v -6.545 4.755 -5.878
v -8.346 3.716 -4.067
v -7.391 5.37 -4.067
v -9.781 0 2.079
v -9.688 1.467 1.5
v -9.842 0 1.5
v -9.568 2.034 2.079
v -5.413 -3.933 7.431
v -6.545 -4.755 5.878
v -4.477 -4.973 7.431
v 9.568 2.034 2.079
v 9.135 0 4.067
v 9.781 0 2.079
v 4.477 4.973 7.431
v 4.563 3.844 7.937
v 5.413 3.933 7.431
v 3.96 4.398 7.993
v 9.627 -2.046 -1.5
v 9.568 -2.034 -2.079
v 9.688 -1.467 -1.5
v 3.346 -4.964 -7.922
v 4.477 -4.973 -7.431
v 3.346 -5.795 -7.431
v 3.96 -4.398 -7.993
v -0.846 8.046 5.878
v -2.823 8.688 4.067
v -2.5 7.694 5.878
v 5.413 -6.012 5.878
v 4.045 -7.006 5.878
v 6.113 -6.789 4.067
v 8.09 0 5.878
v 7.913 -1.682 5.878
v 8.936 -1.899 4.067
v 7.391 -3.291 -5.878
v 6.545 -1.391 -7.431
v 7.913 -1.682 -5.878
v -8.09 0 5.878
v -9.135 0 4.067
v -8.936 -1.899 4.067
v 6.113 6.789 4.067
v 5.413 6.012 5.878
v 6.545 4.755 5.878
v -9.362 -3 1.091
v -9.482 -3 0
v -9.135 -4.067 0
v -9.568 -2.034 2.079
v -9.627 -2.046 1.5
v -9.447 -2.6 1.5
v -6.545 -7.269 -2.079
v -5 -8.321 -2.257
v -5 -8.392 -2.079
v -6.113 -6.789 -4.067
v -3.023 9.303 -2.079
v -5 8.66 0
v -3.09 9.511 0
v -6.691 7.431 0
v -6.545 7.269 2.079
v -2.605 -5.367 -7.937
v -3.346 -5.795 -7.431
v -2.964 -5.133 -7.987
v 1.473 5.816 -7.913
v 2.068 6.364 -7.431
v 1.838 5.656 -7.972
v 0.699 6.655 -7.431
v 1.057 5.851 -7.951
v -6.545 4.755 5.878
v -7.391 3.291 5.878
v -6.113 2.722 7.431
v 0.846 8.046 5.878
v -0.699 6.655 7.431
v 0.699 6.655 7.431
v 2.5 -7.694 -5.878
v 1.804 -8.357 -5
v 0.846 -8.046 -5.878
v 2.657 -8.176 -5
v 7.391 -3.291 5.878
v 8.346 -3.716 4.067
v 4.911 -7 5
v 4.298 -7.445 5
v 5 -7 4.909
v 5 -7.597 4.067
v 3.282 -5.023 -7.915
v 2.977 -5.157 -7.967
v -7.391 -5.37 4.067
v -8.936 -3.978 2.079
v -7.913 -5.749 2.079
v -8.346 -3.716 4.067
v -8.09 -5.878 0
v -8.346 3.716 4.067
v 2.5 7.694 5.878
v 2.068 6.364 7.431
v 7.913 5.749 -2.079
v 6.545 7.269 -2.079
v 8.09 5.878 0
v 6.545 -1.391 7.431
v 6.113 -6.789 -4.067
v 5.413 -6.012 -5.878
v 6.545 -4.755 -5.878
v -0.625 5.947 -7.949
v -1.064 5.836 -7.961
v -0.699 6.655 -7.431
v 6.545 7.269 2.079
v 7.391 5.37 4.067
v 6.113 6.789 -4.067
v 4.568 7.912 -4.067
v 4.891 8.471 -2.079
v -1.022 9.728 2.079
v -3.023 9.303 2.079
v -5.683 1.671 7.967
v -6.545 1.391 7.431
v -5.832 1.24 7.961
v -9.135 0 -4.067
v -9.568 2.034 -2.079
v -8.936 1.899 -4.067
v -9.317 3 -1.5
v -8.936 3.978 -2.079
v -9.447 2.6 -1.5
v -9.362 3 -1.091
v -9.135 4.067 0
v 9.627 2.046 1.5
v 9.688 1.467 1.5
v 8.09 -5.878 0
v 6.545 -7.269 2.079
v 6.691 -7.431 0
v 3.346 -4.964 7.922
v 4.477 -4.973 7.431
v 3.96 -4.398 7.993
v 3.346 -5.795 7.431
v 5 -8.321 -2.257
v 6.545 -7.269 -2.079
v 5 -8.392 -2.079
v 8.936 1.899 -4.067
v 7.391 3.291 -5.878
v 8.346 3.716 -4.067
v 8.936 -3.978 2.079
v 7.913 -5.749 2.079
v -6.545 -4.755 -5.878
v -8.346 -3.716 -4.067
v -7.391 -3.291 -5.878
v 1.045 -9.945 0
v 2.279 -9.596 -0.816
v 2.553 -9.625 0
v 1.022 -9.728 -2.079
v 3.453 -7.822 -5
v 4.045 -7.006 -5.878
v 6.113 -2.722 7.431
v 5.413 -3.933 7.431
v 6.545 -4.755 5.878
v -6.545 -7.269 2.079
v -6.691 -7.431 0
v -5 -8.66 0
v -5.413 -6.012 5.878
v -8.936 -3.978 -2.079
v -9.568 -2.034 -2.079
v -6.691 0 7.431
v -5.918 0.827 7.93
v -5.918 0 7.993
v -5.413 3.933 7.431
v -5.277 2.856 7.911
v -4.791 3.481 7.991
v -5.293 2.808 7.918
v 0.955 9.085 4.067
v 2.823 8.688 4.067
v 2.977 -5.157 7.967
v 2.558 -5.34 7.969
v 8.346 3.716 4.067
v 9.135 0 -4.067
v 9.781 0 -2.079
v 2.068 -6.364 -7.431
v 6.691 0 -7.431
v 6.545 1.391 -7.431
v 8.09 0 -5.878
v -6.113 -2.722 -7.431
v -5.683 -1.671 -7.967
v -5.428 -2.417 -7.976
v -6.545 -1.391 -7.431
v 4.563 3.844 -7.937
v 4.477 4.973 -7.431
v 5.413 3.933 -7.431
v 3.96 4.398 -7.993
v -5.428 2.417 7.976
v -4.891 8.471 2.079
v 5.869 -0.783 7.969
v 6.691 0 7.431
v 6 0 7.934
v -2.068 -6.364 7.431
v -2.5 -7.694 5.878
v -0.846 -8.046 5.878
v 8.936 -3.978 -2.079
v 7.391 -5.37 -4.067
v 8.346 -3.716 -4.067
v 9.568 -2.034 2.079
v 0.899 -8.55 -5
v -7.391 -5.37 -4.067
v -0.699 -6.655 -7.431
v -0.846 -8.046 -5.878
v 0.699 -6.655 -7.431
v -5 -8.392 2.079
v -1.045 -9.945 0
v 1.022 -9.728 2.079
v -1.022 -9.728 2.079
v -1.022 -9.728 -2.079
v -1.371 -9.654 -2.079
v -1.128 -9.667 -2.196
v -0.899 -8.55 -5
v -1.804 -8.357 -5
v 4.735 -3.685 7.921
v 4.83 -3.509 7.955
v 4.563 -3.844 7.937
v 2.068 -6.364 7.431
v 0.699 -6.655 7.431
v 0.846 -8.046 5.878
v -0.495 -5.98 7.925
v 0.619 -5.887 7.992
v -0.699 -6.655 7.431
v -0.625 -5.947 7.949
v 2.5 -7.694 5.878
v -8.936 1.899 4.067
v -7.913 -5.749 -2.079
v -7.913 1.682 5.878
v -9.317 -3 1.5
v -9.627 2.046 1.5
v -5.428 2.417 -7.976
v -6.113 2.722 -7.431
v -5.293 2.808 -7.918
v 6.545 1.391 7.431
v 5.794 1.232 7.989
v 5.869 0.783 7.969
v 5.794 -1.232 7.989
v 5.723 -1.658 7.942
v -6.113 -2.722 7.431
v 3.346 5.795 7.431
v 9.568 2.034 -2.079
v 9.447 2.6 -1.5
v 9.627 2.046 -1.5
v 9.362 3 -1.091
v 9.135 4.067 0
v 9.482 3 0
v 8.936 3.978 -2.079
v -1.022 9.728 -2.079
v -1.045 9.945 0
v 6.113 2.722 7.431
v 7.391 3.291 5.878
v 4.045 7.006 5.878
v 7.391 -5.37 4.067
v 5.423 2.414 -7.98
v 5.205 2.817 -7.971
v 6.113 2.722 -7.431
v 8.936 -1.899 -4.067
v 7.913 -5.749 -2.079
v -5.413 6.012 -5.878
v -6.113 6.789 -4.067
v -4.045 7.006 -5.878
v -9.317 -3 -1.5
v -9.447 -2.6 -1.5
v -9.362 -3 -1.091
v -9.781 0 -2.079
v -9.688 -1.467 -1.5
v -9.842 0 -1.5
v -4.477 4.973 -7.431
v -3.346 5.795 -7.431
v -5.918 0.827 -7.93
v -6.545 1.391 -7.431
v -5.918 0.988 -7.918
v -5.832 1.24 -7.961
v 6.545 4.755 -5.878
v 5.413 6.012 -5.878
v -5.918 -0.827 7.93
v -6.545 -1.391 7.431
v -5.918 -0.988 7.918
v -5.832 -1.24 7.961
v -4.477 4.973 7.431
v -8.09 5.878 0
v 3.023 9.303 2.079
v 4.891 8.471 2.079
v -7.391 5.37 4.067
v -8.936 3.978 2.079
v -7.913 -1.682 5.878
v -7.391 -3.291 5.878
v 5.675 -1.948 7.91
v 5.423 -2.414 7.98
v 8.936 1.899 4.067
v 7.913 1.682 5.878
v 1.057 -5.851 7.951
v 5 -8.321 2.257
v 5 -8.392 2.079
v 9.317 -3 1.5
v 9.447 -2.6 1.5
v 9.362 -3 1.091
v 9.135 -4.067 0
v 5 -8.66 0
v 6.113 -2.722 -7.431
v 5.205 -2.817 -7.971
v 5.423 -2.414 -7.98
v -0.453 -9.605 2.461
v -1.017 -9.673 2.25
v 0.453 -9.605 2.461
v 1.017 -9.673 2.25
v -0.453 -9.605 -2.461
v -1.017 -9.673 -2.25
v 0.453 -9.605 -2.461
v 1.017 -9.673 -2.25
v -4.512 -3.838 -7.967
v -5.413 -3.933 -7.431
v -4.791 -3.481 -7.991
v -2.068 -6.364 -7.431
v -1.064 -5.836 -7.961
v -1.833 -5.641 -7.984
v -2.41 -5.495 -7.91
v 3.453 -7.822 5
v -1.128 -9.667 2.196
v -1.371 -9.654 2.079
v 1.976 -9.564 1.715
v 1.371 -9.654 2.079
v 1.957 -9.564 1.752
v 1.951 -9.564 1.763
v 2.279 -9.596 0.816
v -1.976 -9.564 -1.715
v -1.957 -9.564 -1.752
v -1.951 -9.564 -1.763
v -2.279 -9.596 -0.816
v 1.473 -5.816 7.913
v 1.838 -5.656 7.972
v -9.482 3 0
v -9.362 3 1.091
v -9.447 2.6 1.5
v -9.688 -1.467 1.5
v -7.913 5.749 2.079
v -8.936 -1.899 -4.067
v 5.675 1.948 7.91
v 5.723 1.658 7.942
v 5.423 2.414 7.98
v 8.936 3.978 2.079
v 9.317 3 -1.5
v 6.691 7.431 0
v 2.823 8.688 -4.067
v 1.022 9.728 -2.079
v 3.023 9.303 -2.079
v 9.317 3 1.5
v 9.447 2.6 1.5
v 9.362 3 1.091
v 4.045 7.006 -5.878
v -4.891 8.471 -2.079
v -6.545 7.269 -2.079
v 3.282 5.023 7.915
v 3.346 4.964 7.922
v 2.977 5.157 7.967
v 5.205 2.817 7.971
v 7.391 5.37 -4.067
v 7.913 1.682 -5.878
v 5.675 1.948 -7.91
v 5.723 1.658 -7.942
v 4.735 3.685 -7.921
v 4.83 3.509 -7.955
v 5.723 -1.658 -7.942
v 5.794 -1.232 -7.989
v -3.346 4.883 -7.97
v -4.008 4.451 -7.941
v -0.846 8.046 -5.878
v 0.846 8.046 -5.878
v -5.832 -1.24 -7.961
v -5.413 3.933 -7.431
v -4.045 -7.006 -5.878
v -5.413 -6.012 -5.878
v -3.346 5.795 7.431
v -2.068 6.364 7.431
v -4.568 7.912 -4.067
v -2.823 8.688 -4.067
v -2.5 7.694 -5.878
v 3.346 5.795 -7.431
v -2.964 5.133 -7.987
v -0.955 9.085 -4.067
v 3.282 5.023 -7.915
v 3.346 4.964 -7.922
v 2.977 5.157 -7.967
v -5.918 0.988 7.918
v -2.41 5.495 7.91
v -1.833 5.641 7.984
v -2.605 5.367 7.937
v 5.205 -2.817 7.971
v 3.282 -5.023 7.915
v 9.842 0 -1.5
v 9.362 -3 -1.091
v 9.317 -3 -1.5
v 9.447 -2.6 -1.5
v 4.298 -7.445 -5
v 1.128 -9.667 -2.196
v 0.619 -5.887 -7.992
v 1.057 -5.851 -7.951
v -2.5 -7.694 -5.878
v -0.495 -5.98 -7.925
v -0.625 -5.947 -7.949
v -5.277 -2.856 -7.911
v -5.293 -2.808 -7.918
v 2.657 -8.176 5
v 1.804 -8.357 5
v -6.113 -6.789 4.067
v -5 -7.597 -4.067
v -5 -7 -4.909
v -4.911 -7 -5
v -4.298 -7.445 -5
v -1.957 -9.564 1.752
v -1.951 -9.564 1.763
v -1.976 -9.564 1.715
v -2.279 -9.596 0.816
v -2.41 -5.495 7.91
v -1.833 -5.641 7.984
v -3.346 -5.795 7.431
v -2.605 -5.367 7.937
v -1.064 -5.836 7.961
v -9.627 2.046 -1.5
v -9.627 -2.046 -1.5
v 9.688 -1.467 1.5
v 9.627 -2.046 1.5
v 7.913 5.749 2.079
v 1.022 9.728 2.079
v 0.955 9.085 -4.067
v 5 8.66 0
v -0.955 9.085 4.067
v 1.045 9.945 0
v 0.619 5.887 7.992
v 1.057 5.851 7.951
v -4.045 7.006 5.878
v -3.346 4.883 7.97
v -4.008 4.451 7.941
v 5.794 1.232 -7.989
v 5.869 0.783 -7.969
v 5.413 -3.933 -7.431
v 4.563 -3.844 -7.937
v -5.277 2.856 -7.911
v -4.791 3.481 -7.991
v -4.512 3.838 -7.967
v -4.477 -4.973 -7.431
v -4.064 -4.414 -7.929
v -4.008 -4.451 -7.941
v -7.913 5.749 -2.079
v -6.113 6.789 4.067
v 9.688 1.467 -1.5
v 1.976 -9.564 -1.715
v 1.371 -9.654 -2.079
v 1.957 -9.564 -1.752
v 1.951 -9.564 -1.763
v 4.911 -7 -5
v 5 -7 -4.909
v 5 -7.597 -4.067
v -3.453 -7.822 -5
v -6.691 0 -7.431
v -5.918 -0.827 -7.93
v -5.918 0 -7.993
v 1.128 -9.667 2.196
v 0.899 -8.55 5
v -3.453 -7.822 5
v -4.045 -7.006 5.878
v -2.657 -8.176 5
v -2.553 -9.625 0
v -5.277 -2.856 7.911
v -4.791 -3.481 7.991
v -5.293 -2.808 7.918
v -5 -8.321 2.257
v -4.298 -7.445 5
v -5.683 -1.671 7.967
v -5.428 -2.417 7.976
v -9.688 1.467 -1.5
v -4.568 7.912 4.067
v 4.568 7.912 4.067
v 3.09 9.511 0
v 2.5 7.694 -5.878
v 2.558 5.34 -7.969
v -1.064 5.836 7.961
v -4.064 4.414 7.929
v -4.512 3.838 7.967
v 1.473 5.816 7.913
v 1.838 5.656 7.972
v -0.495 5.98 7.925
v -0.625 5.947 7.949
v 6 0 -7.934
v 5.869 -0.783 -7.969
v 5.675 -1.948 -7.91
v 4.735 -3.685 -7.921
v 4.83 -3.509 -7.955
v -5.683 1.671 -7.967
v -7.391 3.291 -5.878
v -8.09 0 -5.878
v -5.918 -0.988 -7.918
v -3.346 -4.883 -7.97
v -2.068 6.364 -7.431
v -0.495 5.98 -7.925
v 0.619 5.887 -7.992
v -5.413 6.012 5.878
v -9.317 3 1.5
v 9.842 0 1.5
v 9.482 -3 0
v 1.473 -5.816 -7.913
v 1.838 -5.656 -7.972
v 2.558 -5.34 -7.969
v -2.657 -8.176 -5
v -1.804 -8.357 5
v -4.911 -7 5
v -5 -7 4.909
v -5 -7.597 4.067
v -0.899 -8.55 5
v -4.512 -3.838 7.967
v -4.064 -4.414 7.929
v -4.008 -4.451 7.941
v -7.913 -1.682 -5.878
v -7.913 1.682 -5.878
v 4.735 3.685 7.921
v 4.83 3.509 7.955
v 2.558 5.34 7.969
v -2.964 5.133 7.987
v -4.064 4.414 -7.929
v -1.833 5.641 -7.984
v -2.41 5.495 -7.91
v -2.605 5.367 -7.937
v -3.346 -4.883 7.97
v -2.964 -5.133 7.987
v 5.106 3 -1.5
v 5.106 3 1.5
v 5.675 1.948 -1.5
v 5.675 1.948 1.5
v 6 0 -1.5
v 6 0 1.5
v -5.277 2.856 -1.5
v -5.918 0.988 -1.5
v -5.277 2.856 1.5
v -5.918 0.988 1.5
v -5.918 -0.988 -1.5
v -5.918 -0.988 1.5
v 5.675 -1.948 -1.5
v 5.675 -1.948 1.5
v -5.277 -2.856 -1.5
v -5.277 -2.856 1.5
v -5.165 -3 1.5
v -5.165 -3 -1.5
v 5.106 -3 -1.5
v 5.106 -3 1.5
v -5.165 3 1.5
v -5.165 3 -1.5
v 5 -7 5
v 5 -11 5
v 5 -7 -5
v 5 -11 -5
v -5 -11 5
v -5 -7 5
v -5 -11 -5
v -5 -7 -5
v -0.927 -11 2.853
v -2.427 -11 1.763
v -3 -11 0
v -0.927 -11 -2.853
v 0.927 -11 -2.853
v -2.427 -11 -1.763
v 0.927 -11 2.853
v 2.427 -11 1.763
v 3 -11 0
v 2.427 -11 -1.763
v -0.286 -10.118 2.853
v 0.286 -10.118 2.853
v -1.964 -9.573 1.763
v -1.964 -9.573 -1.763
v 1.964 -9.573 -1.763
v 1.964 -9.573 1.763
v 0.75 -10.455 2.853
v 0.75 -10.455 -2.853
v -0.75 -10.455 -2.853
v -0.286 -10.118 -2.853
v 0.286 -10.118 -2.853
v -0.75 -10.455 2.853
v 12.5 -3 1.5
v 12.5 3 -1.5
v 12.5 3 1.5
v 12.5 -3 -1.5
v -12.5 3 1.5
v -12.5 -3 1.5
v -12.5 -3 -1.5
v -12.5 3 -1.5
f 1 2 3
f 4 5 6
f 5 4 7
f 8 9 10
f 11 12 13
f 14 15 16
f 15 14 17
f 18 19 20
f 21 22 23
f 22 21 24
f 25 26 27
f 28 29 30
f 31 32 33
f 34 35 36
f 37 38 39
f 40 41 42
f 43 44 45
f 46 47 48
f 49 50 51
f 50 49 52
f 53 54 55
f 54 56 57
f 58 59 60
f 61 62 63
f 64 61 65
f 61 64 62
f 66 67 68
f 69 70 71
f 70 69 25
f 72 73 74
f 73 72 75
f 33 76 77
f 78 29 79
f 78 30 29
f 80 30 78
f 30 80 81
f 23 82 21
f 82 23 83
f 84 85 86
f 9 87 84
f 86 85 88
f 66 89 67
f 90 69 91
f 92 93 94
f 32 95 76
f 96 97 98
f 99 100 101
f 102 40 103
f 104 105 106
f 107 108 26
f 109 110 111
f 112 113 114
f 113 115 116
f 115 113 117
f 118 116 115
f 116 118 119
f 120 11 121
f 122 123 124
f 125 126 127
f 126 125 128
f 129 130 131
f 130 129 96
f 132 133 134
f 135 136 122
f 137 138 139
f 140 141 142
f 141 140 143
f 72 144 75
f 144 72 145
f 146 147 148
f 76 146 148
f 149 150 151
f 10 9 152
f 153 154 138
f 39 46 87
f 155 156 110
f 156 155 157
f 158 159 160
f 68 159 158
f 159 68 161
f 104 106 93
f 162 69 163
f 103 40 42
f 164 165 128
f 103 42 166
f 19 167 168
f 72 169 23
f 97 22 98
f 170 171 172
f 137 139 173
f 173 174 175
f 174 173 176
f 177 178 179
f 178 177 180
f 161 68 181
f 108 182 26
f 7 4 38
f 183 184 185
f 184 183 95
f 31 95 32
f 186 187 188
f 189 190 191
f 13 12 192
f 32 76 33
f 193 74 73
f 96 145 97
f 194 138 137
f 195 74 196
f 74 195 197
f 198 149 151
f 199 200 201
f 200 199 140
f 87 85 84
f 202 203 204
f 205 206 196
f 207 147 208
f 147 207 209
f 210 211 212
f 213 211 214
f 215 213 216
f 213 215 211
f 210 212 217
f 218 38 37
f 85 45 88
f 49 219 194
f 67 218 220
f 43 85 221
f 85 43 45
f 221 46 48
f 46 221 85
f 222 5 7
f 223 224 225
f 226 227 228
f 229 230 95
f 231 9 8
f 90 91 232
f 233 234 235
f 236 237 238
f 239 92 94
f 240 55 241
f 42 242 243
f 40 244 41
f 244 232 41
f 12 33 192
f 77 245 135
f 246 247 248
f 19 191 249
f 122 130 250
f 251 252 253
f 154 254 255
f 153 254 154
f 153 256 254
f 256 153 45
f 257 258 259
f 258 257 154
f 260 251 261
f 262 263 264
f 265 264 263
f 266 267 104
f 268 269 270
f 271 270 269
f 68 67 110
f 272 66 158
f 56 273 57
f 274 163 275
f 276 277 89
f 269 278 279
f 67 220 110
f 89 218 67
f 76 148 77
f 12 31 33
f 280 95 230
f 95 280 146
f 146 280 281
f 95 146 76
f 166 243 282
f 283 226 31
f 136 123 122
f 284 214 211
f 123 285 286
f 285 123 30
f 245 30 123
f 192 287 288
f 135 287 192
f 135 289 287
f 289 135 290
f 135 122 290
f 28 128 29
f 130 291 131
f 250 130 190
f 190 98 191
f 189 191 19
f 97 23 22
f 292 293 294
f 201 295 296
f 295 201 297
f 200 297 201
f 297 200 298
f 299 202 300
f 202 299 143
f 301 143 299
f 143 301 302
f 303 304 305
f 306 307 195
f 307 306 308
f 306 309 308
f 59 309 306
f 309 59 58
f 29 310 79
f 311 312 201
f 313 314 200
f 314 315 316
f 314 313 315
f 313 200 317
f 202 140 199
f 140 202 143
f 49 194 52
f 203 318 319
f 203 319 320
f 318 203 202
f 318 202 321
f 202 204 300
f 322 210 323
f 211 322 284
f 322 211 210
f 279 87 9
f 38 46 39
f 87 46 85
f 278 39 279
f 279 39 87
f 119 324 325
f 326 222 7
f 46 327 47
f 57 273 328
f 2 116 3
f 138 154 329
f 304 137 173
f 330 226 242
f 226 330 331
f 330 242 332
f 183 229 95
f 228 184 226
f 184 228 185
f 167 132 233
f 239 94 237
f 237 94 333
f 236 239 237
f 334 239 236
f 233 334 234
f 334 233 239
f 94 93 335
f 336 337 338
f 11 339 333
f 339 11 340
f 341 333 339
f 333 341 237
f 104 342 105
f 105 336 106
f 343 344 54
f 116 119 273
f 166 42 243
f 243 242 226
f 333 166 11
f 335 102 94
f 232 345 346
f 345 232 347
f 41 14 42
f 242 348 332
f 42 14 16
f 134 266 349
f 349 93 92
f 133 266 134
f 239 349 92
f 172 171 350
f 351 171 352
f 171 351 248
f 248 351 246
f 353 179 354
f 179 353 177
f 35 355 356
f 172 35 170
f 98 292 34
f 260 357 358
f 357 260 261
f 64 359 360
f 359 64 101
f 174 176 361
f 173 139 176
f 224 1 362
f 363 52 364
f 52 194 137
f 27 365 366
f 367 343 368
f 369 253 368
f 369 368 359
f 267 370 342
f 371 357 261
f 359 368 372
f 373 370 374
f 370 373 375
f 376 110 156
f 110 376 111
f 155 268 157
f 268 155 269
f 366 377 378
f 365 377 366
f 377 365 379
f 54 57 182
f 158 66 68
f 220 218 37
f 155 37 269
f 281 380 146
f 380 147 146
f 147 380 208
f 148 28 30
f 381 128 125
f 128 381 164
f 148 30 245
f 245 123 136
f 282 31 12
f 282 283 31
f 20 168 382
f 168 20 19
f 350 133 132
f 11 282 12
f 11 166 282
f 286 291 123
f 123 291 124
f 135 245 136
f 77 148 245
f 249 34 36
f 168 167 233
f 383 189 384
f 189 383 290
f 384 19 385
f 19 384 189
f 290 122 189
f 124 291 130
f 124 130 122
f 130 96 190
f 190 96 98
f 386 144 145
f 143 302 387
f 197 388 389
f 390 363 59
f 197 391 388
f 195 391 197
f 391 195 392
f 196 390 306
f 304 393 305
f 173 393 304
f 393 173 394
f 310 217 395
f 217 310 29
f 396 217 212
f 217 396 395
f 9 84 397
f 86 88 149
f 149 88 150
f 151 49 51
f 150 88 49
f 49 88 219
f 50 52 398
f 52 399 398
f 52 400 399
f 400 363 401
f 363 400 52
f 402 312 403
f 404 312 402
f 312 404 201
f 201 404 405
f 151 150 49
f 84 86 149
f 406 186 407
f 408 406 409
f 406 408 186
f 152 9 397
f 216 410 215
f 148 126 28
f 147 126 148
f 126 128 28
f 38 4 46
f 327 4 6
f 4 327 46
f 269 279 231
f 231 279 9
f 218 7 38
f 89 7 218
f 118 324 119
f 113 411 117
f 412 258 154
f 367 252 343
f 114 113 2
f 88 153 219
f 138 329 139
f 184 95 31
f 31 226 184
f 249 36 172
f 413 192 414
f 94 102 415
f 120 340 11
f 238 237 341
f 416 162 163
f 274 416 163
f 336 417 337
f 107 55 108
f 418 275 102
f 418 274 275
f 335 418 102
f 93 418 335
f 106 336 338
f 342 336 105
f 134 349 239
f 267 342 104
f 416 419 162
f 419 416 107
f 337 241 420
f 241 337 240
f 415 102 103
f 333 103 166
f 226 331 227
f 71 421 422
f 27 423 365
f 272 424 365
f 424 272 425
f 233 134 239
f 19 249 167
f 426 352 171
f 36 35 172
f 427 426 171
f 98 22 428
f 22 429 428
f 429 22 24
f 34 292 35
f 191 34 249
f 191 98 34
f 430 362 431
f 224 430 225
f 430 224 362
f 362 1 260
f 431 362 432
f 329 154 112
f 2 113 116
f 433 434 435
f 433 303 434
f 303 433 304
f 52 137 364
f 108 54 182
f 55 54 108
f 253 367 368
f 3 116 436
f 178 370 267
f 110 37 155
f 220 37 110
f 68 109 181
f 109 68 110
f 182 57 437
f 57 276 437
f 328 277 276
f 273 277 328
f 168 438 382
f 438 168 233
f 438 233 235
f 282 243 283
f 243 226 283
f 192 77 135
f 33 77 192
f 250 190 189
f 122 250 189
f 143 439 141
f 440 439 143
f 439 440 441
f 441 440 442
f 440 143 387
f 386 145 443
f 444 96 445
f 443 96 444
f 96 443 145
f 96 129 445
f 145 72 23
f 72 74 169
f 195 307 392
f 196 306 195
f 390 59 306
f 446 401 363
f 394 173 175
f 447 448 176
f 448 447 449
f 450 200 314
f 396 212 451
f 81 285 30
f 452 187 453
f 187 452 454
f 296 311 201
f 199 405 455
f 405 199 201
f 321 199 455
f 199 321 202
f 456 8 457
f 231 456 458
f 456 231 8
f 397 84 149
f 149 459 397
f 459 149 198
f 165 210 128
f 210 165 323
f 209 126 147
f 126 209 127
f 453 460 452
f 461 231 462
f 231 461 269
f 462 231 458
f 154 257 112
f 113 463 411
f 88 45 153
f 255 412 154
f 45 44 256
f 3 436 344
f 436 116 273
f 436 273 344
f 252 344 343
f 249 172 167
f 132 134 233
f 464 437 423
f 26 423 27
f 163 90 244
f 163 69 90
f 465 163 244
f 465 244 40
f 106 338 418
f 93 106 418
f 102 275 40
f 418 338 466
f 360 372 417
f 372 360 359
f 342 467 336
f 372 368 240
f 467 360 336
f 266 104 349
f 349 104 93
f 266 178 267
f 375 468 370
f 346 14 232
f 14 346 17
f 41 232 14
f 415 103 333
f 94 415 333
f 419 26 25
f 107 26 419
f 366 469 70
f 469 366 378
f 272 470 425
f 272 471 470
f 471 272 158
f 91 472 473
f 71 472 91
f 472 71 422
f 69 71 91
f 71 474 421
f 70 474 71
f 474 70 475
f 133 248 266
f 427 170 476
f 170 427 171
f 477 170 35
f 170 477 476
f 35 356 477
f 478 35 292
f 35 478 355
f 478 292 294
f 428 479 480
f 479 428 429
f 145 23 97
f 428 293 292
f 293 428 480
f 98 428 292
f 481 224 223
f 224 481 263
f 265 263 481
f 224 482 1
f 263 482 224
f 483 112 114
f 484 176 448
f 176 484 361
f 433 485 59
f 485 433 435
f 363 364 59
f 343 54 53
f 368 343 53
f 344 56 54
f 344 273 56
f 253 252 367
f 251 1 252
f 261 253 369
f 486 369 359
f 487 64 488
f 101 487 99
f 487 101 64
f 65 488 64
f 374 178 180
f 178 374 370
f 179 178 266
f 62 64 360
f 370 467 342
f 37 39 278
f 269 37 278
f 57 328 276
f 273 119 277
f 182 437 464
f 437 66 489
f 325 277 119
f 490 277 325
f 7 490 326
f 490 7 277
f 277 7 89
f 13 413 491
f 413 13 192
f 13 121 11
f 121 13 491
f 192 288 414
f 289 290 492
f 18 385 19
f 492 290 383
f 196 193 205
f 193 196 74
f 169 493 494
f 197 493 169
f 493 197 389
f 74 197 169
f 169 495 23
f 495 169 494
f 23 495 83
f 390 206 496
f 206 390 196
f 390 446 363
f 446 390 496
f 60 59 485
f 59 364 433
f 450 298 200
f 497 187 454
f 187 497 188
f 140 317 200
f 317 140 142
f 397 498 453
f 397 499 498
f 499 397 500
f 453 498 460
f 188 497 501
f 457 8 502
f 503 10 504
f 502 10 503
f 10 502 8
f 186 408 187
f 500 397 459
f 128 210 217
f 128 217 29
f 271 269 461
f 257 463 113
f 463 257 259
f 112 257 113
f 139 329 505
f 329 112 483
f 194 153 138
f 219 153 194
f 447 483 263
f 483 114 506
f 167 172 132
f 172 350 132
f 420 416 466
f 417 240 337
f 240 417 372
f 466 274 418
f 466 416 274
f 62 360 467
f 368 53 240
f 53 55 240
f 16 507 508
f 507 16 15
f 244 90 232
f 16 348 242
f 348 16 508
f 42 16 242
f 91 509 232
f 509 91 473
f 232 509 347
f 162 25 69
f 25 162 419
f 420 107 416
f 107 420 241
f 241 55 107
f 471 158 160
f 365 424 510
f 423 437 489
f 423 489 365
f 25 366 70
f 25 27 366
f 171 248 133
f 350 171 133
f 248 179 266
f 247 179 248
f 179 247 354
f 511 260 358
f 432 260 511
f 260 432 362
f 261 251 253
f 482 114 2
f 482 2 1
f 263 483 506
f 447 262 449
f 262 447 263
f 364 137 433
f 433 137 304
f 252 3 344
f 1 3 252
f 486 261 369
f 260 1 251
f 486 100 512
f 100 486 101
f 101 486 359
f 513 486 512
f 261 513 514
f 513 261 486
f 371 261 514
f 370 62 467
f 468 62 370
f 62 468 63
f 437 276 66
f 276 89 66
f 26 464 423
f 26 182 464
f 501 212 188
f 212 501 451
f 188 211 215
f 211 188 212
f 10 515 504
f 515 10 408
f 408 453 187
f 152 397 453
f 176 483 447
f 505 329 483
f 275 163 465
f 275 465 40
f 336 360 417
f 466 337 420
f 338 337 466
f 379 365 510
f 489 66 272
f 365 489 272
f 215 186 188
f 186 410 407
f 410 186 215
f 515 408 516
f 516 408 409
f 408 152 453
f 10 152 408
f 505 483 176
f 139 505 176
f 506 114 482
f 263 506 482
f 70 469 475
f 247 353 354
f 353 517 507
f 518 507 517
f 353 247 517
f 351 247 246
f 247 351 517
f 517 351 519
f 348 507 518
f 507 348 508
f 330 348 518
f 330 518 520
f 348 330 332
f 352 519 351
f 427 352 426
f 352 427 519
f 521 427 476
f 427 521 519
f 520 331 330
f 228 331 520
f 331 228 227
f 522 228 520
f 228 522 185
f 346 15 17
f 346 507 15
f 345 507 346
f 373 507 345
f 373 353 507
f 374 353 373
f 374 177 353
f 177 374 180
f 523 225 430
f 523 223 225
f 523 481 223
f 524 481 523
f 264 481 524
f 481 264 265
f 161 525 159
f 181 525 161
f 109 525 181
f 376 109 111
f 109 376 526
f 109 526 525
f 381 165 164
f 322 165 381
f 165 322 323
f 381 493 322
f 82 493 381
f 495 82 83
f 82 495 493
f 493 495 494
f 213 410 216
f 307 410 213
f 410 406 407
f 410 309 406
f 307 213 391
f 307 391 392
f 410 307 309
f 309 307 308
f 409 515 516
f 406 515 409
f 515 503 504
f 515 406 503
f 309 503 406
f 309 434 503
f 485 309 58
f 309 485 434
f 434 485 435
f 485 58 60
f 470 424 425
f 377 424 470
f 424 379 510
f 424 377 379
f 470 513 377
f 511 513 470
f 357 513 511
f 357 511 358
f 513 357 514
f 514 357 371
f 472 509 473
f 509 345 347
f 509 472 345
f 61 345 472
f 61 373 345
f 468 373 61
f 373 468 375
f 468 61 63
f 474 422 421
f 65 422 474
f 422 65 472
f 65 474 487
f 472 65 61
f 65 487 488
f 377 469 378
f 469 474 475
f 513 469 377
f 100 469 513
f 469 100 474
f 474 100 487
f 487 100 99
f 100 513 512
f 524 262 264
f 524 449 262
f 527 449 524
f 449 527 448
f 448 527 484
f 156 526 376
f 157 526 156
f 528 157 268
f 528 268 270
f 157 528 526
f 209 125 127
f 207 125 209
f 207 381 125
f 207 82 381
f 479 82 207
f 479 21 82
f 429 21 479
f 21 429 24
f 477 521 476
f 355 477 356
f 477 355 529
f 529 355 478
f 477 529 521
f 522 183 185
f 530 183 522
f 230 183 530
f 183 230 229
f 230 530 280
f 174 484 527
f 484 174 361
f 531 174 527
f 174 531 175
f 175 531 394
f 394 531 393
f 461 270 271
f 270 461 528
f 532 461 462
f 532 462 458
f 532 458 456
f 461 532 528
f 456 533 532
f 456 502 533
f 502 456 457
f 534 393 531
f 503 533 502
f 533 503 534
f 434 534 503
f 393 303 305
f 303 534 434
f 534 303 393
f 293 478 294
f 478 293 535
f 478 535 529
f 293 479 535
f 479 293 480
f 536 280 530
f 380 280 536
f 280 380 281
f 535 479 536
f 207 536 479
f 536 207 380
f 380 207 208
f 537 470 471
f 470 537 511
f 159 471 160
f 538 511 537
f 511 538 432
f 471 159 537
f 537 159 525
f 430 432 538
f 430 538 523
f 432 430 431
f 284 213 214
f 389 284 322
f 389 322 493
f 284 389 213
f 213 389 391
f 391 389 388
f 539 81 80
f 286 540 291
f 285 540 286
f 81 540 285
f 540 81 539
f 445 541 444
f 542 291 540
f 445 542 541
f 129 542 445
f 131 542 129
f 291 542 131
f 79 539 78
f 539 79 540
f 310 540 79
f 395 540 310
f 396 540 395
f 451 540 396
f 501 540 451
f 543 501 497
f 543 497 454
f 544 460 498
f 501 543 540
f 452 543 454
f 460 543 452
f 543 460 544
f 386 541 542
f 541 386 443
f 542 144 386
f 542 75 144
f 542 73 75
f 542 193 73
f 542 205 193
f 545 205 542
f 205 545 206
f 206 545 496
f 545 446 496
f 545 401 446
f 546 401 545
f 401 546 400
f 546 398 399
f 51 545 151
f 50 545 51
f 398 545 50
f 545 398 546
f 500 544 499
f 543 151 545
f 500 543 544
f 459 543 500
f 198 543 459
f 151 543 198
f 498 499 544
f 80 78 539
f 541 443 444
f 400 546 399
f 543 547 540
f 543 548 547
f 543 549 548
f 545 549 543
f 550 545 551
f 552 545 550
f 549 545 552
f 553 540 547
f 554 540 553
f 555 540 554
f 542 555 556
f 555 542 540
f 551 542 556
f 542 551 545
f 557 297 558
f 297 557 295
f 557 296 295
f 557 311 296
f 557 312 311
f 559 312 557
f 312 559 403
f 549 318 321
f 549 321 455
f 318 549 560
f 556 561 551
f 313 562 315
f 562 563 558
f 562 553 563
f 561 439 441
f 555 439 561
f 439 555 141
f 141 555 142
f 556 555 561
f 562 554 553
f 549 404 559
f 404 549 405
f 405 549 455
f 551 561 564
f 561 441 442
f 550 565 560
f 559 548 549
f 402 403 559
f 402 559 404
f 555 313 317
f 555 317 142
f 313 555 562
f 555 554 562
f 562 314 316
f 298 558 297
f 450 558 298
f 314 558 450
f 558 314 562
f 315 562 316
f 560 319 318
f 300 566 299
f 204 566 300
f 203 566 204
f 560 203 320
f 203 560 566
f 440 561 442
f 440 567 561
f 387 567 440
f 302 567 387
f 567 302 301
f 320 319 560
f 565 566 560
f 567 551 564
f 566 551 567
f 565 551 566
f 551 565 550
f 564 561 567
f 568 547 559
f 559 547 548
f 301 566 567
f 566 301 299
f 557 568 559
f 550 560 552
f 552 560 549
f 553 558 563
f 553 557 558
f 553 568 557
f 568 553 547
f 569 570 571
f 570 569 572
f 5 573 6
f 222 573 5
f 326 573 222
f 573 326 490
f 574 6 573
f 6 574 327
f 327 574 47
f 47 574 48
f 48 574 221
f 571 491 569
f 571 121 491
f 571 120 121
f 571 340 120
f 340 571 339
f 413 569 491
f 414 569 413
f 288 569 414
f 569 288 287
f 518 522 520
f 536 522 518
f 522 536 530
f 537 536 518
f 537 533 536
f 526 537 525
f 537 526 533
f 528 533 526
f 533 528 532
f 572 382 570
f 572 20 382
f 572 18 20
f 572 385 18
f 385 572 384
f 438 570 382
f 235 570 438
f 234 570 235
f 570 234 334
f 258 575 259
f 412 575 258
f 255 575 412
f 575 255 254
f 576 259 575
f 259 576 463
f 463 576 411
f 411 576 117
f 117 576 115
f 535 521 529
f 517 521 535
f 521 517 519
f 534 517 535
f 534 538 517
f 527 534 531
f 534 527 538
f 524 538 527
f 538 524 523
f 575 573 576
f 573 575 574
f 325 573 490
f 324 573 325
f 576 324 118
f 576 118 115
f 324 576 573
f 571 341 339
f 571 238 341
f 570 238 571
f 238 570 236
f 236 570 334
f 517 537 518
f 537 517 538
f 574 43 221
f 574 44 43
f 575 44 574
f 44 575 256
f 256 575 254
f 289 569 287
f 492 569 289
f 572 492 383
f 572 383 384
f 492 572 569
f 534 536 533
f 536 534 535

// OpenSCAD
// Volume: 2583.8924648349166, SurfaceArea: 1984.386166640129
difference() {
  sphere(r=10);
  #cylinder(h=30, r=6, center=true);
}
#if (true) cube([25,6,3], center=true);

#translate([0,-9,0]) difference() {
  color("green") cube([10,4,10], center=true);
  color("red") translate([0,-2,0]) sphere(3);
}
